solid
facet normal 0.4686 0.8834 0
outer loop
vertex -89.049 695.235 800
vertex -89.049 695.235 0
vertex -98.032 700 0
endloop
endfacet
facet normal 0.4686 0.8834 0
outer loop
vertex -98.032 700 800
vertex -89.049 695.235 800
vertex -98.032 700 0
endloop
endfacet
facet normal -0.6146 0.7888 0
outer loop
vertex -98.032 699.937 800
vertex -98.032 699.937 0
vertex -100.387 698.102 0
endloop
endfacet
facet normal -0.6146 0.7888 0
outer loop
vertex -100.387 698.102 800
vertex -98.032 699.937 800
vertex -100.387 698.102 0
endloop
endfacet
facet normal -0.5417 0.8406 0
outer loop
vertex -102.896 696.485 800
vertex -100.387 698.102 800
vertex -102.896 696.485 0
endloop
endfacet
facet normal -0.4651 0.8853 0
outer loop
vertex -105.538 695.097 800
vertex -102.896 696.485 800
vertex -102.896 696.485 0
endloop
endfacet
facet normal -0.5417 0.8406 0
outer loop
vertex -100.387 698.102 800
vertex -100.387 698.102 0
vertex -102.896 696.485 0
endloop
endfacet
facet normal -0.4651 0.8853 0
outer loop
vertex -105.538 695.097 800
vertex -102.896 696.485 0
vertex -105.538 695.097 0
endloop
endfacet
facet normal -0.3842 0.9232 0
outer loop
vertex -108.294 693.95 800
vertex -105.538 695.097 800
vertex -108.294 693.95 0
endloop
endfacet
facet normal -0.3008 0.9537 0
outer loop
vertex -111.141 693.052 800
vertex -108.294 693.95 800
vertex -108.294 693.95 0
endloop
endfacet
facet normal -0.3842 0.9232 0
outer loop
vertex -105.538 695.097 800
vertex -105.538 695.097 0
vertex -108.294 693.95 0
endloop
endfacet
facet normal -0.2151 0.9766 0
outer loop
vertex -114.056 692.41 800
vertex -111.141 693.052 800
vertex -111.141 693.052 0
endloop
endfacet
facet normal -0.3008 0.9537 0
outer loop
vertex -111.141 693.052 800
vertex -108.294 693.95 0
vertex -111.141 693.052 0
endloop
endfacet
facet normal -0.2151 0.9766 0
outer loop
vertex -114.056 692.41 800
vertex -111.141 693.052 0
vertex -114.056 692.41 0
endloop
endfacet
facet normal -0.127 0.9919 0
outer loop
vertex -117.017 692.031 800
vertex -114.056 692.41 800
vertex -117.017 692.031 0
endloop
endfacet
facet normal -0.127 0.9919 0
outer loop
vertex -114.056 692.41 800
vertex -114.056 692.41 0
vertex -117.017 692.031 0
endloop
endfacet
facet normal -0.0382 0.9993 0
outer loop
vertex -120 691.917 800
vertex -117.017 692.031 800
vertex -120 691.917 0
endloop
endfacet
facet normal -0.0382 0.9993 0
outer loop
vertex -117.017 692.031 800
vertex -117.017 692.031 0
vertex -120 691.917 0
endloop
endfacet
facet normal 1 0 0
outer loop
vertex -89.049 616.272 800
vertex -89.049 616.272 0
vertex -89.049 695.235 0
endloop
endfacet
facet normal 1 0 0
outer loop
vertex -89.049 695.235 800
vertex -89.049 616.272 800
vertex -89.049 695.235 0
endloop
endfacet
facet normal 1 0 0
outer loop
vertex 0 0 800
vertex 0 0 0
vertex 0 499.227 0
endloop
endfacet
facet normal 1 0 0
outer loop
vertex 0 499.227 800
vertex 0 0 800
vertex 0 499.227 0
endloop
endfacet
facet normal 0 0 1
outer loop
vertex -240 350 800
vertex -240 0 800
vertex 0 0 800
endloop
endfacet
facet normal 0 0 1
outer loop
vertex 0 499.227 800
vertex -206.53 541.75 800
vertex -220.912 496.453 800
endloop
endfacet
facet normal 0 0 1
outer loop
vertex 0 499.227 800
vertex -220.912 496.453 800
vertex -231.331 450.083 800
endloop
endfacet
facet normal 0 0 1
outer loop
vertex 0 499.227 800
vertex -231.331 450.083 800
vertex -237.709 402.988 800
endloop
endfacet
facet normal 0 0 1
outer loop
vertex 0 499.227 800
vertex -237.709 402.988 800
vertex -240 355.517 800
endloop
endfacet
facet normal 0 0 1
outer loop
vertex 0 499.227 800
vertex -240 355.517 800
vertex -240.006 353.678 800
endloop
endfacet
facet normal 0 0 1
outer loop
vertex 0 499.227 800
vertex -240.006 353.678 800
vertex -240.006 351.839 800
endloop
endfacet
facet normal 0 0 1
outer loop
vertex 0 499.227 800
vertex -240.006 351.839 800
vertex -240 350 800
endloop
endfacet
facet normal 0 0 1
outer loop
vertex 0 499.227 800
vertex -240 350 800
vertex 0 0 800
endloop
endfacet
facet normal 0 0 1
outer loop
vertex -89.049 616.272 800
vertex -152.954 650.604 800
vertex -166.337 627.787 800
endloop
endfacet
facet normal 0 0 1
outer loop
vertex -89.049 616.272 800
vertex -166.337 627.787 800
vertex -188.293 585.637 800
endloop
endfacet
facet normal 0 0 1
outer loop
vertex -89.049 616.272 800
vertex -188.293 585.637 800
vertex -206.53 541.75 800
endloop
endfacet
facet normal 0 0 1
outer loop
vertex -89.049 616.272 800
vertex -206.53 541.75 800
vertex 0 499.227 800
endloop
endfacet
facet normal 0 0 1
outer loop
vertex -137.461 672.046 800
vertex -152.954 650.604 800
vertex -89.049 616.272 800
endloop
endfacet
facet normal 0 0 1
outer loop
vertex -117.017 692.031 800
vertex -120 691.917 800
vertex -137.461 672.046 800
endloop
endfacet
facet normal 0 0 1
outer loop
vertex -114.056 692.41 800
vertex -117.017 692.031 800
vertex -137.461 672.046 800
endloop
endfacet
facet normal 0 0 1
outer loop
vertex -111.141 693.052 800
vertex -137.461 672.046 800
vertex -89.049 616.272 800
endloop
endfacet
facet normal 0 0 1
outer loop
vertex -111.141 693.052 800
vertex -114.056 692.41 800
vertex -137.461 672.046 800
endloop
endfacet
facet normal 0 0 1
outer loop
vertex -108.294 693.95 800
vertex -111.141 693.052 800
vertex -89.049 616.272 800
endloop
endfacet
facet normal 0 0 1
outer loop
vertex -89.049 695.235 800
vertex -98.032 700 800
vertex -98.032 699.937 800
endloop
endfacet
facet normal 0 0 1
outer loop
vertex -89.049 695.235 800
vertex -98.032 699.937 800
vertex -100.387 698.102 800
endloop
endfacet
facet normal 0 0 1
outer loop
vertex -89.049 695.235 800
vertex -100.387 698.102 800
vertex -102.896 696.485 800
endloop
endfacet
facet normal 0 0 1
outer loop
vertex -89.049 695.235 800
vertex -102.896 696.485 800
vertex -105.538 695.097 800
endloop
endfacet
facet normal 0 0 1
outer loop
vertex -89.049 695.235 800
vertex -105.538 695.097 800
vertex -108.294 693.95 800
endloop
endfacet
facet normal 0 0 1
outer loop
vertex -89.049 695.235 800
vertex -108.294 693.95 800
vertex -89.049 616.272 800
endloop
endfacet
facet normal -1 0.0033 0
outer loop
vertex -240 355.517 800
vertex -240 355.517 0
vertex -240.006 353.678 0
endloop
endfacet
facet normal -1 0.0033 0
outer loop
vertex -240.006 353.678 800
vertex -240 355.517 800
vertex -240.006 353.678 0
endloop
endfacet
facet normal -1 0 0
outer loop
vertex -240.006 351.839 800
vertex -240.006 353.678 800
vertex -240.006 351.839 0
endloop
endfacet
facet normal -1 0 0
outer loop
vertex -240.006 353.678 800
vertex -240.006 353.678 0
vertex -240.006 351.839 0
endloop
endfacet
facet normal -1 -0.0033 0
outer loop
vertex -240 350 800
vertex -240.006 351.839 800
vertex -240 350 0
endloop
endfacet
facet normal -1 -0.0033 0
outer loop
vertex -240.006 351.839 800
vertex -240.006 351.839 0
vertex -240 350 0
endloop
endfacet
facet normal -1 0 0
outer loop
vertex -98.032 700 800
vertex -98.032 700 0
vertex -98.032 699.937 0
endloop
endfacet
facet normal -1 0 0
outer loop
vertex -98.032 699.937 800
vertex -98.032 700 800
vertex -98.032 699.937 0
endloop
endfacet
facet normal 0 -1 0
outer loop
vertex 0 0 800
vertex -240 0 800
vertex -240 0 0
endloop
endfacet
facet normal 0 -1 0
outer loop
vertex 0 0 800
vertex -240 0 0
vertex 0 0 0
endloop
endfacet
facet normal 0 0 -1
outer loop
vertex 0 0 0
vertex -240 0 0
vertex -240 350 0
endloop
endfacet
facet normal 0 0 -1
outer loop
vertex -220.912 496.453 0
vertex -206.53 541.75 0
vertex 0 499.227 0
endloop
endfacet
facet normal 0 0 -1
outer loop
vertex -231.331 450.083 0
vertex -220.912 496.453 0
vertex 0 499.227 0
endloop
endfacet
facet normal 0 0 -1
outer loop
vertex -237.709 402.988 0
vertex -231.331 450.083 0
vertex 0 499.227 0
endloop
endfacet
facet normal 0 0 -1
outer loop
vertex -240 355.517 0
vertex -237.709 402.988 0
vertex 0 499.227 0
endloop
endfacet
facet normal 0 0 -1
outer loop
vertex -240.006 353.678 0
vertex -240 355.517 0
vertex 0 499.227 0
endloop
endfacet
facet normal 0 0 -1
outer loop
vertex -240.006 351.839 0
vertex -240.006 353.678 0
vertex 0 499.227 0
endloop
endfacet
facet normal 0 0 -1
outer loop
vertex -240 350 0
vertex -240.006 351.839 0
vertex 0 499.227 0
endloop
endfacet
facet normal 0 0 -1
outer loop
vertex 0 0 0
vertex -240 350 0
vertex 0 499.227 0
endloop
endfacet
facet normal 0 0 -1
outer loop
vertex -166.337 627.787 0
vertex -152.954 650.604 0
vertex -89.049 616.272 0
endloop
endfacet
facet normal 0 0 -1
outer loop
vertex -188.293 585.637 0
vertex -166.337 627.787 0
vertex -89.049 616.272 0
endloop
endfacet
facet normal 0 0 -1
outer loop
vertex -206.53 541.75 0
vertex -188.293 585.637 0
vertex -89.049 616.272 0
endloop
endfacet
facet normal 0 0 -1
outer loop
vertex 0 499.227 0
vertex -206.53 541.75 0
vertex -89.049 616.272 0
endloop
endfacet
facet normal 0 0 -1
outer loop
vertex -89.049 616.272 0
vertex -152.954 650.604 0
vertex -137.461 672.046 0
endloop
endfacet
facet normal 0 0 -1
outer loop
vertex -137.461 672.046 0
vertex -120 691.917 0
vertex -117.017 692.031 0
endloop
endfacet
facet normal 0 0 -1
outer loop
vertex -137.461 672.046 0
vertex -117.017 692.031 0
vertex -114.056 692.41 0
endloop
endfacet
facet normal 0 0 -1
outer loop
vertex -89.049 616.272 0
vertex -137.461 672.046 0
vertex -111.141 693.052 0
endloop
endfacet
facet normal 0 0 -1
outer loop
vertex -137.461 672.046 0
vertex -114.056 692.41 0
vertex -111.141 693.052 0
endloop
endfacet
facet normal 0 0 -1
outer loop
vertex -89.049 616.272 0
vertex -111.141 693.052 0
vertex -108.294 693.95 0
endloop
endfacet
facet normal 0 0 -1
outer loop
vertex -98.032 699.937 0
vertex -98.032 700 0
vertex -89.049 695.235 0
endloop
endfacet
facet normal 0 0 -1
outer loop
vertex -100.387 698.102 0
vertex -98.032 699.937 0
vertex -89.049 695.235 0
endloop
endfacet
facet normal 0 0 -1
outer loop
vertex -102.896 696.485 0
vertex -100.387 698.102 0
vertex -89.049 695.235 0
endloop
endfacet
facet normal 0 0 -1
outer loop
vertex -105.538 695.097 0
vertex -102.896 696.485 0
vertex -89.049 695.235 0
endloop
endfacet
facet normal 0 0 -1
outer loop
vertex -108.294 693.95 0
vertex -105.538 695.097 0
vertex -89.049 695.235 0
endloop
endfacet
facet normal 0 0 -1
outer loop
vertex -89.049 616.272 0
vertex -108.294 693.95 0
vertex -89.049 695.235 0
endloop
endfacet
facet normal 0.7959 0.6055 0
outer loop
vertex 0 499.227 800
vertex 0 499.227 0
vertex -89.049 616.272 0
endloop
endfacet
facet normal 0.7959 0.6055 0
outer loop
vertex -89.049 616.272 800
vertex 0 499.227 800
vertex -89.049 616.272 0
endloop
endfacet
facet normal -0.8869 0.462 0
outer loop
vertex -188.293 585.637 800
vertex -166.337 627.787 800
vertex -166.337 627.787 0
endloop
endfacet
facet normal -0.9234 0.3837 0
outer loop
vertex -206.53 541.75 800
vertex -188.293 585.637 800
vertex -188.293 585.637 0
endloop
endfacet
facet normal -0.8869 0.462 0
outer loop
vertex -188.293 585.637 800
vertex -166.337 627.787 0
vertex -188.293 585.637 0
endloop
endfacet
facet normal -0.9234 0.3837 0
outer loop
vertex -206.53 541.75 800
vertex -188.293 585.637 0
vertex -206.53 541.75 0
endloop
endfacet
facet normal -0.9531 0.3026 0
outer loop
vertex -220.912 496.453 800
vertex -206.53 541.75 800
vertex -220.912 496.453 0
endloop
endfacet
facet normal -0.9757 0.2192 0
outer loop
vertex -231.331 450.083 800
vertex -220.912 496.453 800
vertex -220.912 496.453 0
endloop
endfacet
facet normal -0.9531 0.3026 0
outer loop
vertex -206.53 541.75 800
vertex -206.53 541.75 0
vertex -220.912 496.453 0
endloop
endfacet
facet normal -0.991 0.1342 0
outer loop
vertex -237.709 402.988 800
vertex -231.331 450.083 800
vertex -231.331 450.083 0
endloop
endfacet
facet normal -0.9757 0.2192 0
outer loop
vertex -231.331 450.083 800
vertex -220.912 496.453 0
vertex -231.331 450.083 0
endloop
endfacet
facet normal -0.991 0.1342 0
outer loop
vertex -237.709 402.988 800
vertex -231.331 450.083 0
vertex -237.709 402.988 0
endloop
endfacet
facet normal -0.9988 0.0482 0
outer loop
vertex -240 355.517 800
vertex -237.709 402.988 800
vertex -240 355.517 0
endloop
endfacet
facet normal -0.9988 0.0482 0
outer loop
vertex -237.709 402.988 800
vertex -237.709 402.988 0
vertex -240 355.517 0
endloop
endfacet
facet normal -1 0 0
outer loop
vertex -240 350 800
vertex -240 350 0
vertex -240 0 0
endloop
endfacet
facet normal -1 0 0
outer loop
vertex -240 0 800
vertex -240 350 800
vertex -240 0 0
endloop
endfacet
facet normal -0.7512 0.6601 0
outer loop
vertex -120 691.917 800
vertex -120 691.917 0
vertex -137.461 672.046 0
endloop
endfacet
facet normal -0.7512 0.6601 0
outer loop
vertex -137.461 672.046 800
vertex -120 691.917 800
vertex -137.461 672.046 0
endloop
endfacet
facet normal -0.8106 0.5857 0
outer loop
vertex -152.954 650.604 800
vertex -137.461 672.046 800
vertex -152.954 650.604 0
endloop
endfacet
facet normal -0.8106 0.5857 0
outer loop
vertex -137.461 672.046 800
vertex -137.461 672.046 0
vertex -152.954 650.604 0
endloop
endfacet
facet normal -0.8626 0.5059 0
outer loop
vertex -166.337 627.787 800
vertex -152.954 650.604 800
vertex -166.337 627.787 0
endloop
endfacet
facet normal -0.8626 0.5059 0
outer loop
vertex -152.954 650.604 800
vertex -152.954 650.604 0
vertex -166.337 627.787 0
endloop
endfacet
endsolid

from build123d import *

# Parameters (mm, degrees)
F1_DEPTH = 800


with BuildPart() as f1:
    # F0 (on Top) → F1 (new body)
    with BuildSketch(Plane.XY):
        Polygon((-89.048881, 0), (0, 0), (0, 499.227196), (-89.048881, 616.271885), align=None)
        Polygon((-98.031923, 0), (-89.048881, 0), (-89.048881, 616.271885), (-89.048881, 695.234752), (-98.031923, 700), (-98.031923, 699.936681), align=None)
        with BuildLine():
            Line((-120, 0), (-98.031923, 0))
            Line((-98.031923, 0), (-98.031923, 699.936681))
            ThreePointArc((-98.031923, 699.936681), (-108.294154, 693.949508), (-120, 691.916585))
            Line((-120, 691.916585), (-120, 0))
        make_face()
        with BuildLine():
            Line((-240, 0), (-120, 0))
            Line((-120, 0), (-120, 691.916585))
            ThreePointArc((-120, 691.916585), (-145.462987, 661.509664), (-166.336656, 627.786756))
            ThreePointArc((-166.336656, 627.786756), (-220.911757, 496.452626), (-240, 355.517413))
            Line((-240, 355.517413), (-240, 350))
            Line((-240, 350), (-240, 0))
        make_face()
        with BuildLine():
            ThreePointArc((-240, 355.517413), (-240.006916, 352.758707), (-240, 350))
            Line((-240, 350), (-240, 355.517413))
        make_face()
    extrude(amount=F1_DEPTH)


solid = f1.part
